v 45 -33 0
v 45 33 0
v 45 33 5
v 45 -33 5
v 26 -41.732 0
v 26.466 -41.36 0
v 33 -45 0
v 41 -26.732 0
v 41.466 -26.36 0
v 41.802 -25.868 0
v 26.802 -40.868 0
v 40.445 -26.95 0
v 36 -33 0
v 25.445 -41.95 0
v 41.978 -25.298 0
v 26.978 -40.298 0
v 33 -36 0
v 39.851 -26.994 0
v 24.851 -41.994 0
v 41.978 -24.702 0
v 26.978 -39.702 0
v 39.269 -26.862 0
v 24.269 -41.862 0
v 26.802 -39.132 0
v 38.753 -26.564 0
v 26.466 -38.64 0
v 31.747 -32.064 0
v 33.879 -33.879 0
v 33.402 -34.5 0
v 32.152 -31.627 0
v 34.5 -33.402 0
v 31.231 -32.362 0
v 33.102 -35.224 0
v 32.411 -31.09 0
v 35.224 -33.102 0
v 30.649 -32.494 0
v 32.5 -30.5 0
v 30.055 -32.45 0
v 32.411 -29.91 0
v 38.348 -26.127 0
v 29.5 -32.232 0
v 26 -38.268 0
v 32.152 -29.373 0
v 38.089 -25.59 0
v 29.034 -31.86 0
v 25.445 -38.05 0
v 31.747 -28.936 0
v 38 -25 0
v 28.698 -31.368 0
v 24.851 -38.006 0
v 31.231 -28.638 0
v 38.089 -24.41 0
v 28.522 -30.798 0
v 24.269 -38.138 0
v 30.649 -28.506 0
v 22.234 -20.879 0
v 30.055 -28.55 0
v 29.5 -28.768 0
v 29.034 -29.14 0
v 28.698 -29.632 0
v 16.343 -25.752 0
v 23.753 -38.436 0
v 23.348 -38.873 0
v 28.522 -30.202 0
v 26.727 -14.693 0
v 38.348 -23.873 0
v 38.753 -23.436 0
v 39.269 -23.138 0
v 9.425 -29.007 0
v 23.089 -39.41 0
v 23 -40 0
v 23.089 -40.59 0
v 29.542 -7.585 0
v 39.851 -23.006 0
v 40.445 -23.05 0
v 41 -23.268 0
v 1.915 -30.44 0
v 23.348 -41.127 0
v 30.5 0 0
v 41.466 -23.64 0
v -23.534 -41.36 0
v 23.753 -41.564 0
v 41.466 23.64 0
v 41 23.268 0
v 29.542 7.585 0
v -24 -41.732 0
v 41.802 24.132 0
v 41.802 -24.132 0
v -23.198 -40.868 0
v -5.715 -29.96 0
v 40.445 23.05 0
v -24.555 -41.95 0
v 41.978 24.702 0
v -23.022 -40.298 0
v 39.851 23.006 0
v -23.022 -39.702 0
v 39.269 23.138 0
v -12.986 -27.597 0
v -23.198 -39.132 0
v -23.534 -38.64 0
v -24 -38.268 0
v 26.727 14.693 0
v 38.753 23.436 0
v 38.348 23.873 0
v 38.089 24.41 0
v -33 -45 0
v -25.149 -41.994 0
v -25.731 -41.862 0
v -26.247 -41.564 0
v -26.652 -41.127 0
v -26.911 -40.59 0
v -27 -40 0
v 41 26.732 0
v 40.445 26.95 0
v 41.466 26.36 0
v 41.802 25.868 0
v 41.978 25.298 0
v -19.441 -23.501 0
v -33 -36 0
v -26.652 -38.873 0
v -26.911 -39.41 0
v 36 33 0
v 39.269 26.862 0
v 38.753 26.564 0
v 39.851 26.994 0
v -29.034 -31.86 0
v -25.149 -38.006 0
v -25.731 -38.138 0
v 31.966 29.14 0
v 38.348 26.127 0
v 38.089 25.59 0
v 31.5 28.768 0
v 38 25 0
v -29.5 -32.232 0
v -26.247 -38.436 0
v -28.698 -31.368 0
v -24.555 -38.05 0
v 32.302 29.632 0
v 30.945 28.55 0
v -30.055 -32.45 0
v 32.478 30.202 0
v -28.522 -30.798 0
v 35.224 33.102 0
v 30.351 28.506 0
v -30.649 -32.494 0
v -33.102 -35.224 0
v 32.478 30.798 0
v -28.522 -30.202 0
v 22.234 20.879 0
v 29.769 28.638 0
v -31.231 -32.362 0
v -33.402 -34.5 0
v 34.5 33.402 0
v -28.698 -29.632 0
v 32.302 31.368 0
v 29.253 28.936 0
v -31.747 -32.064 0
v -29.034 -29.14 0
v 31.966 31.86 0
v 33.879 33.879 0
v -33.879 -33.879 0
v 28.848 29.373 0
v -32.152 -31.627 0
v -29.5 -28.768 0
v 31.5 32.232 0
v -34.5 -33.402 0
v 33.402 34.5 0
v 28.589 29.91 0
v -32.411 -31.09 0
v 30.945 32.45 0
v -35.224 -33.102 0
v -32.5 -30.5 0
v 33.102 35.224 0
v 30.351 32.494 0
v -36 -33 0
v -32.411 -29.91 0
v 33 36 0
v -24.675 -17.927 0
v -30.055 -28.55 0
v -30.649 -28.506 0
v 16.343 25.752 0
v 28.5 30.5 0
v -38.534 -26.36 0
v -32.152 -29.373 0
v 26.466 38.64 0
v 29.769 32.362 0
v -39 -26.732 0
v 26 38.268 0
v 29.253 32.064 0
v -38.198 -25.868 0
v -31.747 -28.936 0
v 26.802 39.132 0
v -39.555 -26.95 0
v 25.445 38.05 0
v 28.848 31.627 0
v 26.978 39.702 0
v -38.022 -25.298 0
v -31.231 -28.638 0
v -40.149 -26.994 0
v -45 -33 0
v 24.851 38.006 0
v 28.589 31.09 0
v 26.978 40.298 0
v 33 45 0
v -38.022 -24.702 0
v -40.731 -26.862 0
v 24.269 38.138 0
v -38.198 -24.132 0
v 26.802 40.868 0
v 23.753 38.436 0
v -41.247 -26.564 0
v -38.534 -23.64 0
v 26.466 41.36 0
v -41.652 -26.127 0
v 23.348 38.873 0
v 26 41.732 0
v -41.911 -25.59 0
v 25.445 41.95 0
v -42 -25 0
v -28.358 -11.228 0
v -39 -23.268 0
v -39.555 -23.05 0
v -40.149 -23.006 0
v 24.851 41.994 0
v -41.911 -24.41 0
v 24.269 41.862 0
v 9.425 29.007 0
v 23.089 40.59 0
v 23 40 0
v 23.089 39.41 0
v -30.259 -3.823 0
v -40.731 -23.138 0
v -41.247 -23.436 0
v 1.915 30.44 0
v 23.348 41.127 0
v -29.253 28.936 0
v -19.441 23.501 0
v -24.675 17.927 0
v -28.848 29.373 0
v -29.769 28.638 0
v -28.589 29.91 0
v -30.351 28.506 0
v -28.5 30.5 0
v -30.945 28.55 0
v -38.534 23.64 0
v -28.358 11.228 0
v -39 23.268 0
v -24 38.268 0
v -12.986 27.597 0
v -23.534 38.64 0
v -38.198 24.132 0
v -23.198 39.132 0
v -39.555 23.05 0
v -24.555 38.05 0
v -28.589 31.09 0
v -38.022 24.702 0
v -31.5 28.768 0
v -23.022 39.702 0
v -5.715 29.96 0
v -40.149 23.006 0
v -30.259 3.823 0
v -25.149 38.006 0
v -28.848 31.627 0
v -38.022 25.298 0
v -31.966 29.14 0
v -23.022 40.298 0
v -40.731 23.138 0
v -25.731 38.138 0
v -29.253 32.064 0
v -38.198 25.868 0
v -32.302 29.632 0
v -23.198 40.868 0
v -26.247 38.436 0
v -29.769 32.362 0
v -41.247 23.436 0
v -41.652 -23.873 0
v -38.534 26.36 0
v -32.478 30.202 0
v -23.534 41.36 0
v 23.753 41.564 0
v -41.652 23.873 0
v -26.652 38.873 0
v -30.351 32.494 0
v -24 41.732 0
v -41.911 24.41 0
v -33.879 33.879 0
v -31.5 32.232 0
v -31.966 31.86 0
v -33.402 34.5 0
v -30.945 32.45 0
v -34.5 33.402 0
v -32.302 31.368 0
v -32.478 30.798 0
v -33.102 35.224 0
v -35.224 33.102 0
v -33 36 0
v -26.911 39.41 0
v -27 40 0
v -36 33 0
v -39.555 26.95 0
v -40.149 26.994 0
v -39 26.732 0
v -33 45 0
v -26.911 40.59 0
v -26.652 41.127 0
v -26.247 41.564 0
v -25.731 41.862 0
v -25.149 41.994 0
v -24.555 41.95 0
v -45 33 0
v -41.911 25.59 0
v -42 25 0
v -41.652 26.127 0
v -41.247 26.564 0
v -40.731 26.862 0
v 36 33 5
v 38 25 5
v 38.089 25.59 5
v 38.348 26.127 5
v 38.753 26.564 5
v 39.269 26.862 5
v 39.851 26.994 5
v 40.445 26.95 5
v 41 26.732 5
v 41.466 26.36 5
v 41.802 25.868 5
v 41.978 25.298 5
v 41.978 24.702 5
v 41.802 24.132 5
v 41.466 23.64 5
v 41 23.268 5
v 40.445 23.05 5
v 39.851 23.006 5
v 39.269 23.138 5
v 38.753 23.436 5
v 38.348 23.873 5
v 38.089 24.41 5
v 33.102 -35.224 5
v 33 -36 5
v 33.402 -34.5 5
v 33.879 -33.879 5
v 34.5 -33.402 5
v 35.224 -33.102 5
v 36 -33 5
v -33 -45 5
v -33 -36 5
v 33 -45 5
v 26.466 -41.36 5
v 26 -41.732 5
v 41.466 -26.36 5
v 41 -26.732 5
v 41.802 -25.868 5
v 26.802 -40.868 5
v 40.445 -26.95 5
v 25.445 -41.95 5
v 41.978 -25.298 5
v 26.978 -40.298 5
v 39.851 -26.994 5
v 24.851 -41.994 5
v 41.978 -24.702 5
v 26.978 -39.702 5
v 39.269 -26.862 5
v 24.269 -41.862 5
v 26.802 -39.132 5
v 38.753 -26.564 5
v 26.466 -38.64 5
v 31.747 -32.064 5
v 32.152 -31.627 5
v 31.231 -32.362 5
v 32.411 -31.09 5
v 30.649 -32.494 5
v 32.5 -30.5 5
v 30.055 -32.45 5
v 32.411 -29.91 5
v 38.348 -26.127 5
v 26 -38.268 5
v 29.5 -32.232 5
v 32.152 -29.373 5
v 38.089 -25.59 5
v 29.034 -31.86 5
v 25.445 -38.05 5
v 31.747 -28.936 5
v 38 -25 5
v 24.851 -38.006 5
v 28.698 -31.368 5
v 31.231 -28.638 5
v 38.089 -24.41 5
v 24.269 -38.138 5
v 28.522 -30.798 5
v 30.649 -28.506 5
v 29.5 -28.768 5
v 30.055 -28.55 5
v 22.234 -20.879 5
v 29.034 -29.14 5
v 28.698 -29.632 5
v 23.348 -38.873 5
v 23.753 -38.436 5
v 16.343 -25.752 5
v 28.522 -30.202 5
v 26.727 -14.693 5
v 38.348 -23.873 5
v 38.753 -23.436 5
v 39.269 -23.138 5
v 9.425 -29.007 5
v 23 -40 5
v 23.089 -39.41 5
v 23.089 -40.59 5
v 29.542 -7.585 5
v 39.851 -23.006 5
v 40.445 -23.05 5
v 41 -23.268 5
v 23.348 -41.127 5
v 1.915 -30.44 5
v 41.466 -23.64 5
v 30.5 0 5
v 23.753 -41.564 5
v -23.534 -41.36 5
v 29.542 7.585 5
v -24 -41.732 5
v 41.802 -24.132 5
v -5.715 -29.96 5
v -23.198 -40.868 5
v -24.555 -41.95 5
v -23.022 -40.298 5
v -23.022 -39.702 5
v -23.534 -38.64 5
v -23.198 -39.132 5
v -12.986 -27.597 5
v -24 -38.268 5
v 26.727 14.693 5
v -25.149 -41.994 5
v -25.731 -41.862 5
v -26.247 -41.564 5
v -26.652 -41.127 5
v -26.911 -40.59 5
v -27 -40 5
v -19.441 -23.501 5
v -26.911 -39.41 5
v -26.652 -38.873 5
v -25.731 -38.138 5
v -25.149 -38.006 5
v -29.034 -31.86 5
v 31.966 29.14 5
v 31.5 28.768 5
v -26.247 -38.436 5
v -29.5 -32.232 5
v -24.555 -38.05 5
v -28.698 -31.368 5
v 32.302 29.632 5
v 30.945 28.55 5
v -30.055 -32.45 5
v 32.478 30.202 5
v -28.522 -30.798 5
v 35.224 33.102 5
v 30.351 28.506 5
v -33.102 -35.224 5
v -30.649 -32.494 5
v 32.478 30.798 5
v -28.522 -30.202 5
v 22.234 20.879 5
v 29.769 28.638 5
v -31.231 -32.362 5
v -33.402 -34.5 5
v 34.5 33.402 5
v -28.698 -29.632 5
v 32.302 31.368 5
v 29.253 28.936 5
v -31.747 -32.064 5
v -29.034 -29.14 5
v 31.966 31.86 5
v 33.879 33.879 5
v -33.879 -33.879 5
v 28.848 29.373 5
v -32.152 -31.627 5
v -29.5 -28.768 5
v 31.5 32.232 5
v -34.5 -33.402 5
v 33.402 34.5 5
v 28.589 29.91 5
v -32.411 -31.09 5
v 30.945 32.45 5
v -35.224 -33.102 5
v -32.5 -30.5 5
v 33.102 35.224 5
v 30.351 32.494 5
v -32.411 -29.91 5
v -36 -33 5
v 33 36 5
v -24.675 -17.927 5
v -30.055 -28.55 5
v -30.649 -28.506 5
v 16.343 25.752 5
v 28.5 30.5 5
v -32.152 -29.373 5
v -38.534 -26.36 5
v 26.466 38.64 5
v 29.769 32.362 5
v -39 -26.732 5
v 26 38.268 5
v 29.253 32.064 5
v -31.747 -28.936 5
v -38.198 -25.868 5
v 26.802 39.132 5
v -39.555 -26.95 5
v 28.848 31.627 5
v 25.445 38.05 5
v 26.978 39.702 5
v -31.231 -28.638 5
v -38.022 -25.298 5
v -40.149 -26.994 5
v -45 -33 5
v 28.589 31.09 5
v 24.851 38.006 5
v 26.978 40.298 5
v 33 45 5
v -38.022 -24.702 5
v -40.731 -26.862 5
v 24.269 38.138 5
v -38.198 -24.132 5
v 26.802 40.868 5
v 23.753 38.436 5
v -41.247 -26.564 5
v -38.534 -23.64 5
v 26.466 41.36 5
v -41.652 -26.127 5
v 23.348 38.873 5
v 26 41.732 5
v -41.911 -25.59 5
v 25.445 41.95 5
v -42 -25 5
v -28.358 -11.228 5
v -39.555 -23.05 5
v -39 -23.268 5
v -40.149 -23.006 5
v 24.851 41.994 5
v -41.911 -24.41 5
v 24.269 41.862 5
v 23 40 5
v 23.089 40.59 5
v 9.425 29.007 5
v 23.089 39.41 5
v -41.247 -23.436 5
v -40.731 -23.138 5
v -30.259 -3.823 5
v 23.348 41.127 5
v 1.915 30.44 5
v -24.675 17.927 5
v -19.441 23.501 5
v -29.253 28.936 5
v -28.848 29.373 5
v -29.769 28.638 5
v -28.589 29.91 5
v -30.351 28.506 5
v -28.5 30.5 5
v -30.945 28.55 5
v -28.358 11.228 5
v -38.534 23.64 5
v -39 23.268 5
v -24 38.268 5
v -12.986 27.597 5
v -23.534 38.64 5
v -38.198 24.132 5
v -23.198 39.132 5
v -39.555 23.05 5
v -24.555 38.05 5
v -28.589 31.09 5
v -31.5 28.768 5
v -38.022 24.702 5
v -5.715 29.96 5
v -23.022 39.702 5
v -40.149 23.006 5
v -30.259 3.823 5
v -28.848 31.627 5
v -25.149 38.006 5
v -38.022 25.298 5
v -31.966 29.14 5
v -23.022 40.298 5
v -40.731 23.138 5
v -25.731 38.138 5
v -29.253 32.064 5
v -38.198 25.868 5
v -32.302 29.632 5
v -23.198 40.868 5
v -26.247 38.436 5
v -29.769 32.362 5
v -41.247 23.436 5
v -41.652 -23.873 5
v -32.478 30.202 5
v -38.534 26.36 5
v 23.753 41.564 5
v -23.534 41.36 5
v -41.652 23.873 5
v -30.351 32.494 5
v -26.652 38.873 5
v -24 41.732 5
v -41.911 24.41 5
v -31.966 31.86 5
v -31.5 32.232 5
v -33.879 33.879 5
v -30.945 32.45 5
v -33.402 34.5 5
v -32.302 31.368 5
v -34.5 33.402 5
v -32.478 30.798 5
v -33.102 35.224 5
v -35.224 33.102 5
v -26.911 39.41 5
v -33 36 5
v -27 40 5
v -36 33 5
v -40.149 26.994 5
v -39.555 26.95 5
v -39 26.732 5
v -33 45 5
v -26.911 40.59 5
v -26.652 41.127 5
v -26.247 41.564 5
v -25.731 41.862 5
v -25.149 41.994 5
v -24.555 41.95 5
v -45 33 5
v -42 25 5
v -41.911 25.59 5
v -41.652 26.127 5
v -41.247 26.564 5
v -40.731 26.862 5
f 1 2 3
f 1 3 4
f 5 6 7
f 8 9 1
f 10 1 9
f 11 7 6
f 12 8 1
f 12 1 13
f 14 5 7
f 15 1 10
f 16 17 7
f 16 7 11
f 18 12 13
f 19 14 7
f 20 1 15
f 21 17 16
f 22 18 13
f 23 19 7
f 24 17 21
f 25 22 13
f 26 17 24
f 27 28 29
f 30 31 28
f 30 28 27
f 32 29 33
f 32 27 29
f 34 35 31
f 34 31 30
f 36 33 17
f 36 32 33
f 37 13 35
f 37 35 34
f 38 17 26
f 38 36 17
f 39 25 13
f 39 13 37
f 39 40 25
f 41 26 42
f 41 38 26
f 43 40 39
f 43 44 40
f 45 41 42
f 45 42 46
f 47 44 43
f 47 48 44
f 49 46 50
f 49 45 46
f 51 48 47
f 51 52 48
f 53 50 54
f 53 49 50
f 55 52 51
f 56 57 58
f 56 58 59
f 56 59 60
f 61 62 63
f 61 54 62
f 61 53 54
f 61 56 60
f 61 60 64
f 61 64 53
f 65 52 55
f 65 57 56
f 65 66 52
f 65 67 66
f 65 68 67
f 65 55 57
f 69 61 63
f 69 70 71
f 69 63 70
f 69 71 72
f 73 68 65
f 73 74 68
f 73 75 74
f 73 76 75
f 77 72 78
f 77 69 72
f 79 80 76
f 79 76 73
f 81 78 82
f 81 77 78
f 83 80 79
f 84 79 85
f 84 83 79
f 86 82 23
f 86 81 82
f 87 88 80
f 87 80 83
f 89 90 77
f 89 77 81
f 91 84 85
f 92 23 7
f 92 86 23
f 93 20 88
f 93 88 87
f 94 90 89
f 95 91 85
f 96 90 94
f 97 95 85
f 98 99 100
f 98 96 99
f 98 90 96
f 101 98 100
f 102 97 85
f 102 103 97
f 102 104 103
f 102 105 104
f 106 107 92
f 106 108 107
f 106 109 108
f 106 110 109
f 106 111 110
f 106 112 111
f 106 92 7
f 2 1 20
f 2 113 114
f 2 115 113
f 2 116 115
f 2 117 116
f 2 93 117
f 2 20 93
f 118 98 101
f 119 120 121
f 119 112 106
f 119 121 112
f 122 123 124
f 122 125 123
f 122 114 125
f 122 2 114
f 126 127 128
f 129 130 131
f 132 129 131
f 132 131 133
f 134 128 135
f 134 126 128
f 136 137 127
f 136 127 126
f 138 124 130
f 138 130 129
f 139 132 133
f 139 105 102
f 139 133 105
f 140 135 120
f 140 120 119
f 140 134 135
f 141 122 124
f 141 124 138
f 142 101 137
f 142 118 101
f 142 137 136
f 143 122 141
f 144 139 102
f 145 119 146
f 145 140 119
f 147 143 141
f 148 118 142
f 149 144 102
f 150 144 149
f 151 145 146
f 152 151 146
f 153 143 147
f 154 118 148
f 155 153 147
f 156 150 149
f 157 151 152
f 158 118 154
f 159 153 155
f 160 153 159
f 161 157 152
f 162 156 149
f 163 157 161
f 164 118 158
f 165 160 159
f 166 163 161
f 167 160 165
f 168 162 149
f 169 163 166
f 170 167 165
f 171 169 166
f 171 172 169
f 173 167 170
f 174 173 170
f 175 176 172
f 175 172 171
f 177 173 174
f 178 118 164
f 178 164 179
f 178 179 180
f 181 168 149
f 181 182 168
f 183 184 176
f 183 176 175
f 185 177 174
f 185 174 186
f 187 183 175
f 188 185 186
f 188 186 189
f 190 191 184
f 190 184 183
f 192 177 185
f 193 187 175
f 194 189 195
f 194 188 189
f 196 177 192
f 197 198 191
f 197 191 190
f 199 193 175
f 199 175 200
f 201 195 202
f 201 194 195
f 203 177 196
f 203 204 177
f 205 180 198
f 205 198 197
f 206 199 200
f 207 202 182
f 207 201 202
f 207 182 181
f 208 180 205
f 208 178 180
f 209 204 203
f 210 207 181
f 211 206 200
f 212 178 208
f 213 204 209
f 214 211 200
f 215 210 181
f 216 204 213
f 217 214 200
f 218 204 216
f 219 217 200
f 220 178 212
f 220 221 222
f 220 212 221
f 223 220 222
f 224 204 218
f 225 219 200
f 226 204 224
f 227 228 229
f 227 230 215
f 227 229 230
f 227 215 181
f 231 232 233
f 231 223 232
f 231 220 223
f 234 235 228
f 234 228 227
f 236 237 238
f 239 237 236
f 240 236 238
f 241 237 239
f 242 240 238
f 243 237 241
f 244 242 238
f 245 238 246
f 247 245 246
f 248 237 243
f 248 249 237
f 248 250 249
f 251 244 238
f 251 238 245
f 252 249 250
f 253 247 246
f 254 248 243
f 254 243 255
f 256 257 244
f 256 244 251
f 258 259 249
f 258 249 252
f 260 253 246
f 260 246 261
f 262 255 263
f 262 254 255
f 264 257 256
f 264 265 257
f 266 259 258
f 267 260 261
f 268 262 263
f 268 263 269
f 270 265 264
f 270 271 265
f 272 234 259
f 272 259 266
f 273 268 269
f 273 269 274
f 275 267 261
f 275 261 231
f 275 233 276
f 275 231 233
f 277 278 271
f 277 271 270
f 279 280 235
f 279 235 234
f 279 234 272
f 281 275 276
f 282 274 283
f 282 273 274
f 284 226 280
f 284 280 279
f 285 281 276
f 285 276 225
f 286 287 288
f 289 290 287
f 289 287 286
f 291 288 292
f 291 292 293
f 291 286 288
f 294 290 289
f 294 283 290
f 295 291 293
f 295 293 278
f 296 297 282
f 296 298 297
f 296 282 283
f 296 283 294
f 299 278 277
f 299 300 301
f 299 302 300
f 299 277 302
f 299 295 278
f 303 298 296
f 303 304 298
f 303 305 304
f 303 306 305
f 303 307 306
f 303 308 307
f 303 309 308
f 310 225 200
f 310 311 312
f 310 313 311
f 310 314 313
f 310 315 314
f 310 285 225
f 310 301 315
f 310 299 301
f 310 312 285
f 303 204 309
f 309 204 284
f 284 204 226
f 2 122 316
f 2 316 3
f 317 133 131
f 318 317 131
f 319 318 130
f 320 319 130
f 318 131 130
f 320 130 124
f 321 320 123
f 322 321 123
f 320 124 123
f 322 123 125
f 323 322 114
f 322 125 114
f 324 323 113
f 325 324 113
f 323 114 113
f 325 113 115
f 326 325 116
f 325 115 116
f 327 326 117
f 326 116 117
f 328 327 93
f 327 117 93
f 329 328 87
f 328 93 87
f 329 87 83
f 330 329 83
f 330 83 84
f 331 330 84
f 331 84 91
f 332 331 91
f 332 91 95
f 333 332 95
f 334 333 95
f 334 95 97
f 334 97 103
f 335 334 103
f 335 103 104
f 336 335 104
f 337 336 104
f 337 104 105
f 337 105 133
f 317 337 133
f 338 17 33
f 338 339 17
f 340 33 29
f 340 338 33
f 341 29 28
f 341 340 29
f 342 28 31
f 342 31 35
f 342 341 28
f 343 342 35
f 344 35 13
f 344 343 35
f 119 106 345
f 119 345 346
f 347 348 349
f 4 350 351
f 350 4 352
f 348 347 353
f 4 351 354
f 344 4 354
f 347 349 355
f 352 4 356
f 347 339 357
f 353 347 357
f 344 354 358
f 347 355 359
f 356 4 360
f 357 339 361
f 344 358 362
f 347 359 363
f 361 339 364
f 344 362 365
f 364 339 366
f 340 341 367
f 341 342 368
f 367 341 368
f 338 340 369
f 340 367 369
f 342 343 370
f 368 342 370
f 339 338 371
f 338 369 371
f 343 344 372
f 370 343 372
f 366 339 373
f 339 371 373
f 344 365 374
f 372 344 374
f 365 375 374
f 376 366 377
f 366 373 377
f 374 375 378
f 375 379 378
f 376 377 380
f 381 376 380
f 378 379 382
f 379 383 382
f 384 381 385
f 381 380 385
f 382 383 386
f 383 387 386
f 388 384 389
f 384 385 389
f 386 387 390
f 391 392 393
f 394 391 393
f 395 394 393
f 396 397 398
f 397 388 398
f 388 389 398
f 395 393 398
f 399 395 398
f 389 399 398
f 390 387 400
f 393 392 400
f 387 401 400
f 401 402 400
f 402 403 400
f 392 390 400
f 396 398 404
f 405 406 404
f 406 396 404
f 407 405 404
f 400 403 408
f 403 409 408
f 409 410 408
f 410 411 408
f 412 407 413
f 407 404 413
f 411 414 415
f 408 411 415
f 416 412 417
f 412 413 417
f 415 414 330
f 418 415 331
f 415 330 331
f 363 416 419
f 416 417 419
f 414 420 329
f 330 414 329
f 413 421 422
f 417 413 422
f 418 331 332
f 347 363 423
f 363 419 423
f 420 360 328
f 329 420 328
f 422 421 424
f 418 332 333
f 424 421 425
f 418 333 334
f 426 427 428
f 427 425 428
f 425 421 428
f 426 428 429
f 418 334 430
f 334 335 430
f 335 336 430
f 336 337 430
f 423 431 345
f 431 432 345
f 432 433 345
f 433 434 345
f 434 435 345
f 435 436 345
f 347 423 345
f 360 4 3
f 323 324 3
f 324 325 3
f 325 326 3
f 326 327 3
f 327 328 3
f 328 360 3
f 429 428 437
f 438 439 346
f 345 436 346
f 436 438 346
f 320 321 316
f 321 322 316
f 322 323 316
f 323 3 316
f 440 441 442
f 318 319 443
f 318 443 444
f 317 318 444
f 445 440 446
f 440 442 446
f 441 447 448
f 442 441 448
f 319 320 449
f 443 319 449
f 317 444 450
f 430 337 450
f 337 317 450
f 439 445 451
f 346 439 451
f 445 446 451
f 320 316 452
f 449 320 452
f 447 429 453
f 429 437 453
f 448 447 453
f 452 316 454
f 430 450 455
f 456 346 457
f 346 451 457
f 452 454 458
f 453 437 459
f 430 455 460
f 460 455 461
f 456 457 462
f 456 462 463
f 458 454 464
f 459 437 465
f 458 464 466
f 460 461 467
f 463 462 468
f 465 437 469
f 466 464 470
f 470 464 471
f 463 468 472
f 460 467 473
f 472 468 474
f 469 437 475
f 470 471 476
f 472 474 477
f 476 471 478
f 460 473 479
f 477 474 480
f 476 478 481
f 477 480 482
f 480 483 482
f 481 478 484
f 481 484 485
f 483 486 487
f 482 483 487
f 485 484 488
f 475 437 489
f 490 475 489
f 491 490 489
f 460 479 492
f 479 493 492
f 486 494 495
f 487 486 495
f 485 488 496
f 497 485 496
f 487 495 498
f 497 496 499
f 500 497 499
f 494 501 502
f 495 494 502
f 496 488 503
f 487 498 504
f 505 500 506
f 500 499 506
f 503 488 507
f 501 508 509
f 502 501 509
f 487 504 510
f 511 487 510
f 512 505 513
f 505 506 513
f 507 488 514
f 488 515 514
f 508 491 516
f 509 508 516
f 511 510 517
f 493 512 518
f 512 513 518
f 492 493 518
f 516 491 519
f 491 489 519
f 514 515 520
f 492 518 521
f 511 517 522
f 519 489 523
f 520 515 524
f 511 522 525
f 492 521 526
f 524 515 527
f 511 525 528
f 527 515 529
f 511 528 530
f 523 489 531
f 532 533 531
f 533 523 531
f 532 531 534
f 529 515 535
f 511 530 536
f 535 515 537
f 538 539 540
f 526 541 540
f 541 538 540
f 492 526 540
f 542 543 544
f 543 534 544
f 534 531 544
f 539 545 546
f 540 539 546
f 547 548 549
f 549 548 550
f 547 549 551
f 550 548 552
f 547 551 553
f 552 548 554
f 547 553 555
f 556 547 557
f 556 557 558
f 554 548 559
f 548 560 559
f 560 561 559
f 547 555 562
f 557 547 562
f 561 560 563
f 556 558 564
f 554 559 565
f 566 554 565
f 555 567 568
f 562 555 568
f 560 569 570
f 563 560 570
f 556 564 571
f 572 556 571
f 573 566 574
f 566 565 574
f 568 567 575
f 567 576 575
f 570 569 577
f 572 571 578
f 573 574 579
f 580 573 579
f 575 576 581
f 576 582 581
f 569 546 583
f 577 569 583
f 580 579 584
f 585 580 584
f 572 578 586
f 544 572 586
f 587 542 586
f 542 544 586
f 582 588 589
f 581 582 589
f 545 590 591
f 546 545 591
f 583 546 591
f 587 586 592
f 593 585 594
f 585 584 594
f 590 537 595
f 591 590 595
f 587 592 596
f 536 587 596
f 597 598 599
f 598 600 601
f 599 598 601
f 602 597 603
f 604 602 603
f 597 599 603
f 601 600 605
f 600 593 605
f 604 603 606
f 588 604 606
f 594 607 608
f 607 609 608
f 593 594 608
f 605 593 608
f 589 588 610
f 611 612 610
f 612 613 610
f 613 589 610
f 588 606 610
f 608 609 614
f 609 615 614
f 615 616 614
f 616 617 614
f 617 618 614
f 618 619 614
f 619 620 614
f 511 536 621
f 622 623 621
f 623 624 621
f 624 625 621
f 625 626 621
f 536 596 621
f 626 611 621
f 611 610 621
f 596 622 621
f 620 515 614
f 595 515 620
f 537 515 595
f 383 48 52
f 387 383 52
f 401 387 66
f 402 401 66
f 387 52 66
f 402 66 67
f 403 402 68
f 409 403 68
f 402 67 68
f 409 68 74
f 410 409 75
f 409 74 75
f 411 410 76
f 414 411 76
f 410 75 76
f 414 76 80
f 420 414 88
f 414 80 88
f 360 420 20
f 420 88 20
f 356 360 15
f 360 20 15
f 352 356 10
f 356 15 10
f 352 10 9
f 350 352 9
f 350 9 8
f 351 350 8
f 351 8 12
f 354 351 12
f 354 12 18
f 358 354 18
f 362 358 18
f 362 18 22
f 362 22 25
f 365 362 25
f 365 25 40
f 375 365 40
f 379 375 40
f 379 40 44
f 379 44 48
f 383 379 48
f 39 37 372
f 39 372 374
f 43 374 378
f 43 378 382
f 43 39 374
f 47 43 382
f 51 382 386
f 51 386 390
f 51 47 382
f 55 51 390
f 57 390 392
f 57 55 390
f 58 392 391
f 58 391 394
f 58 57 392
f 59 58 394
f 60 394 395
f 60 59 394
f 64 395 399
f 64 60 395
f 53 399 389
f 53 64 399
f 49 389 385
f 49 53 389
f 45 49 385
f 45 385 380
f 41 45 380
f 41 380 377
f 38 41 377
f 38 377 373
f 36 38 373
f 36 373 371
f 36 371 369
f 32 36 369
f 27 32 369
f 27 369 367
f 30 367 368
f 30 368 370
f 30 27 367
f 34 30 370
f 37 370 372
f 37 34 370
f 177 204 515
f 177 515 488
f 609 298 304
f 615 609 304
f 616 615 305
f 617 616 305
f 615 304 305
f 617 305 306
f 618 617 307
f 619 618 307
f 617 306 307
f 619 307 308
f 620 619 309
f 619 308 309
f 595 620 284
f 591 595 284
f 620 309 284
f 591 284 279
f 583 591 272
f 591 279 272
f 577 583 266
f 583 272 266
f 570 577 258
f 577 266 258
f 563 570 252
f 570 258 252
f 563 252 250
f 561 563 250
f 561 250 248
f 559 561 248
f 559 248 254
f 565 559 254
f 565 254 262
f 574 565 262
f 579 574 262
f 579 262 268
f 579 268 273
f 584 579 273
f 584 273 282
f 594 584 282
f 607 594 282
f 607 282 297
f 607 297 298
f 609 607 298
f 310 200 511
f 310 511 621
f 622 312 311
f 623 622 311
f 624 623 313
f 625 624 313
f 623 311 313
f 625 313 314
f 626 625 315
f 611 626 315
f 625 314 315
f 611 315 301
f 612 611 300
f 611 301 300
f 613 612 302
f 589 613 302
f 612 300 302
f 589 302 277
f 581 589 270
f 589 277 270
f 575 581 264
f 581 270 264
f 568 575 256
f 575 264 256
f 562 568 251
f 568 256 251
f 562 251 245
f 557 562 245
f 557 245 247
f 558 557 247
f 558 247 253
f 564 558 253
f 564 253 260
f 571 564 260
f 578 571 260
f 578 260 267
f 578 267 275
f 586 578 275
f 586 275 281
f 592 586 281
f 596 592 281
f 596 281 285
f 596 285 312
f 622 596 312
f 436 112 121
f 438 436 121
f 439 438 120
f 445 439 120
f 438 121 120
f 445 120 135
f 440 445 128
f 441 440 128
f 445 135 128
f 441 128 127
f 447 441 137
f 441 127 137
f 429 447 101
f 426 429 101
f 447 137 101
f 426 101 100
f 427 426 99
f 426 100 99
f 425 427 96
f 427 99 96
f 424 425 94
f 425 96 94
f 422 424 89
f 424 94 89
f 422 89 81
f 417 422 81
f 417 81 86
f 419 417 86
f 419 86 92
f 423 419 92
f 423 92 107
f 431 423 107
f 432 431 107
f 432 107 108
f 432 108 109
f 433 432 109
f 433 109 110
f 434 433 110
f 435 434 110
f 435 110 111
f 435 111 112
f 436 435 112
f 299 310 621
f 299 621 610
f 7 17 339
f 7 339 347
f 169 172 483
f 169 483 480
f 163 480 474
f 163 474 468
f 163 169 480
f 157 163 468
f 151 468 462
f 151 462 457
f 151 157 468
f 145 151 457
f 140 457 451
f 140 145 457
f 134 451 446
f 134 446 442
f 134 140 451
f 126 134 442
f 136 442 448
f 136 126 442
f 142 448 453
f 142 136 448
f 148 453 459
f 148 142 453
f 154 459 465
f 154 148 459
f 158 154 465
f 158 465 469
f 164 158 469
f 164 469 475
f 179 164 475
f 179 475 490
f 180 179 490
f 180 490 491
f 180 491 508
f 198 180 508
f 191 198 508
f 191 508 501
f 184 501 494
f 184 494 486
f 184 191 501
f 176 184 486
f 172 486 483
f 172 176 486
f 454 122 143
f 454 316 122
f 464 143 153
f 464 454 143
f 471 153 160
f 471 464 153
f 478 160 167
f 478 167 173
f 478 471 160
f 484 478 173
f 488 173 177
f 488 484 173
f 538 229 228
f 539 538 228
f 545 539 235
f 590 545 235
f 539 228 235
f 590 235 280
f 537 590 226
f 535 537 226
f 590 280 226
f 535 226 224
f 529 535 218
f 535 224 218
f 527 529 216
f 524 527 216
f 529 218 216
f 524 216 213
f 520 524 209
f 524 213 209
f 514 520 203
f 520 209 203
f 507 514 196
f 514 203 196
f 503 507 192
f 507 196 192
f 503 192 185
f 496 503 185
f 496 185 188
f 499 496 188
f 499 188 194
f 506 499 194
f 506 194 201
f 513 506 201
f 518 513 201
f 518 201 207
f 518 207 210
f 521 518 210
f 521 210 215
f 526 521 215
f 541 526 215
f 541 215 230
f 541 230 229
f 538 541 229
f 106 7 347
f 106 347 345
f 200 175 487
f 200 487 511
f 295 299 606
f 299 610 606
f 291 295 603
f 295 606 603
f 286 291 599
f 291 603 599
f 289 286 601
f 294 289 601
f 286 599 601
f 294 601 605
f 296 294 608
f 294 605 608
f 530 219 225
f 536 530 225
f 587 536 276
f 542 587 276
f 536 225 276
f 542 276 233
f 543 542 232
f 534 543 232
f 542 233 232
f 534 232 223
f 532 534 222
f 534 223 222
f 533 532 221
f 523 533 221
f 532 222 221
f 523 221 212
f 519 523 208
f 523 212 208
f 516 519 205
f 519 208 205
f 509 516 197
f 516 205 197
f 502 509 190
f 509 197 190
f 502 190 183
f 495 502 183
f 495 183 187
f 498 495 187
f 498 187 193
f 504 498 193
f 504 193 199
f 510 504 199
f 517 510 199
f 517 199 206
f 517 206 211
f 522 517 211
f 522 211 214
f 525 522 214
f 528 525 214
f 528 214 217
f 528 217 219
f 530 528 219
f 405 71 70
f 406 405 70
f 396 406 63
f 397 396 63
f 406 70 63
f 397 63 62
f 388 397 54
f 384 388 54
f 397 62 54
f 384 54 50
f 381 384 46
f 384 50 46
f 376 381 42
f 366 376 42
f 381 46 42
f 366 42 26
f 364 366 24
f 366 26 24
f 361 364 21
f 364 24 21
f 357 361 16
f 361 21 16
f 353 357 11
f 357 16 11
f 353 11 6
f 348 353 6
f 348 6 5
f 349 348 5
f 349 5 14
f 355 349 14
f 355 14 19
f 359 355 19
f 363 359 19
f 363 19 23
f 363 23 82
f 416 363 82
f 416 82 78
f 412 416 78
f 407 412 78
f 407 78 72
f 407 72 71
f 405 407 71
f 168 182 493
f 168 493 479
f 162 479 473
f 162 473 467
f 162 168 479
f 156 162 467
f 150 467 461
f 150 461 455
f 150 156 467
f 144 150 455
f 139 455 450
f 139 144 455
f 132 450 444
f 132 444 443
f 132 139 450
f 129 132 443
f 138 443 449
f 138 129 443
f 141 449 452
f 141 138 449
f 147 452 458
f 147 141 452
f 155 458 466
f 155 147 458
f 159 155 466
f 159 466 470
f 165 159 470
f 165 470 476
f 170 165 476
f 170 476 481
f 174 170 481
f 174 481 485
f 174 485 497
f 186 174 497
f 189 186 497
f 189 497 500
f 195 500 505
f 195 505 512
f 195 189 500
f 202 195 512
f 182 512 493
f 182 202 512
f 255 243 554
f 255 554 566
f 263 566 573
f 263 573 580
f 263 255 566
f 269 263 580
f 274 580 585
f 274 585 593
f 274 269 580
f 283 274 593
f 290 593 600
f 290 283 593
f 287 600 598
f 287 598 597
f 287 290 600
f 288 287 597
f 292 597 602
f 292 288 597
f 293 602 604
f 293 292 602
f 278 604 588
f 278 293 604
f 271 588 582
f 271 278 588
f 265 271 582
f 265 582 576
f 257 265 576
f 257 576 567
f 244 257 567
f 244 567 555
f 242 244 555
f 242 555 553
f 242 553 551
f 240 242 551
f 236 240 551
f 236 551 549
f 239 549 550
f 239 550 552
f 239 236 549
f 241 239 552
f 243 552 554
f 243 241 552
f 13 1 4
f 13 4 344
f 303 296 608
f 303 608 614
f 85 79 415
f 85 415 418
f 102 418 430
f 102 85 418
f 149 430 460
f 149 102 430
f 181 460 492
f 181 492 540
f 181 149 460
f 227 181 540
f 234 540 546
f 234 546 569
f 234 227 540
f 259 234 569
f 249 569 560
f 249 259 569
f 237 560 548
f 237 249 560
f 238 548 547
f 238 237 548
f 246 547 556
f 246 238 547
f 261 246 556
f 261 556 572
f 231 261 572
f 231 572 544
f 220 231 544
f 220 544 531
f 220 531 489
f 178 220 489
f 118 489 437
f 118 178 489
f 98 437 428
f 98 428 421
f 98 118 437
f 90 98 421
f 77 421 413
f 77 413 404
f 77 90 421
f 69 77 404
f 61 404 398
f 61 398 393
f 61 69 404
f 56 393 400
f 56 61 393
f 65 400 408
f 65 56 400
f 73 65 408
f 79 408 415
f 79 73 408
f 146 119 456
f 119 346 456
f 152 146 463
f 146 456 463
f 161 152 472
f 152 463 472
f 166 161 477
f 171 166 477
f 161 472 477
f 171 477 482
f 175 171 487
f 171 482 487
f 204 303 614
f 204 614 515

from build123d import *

# Parameters (mm, degrees)
SKETCH1_R           = 30.5
SKETCH1_R_2         = 2
BOSS_EXTRUDE1_DEPTH = 5
FILLET1_R           = 3
CUT_EXTRUDE1_REACH  = 65.836
SKETCH2_R           = 2


with BuildPart() as part:
    # Sketch1 → Boss-Extrude1 (new body)
    with BuildSketch(Plane.XY):
        Polygon((33, -45), (-33, -45), (-33, -33), (-45, -33), (-45, 33), (-33, 33), (-33, 45), (33, 45), (33, 33), (45, 33), (45, -33), (33, -33), align=None)
        Circle(SKETCH1_R, mode=Mode.SUBTRACT)
        with Locations((-30.5, 30.5)):
            Circle(SKETCH1_R_2, mode=Mode.SUBTRACT)
        with Locations(Location((30.5, 30.5, 0), (0, 0, 180))):
            Circle(SKETCH1_R_2, mode=Mode.SUBTRACT)
        with Locations((30.5, -30.5)):
            Circle(SKETCH1_R_2, mode=Mode.SUBTRACT)
        with Locations(Location((-30.5, -30.5, 0), (0, 0, 180))):
            Circle(SKETCH1_R_2, mode=Mode.SUBTRACT)
    extrude(amount=BOSS_EXTRUDE1_DEPTH)

    # Fillet1
    fillet1_edges = [part.edges().sort_by_distance(p)[0] for p in [
        (33, 33, 2.5),
        (33, -33, 2.5),
        (-33, -33, 2.5),
        (-33, 33, 2.5),
    ]]
    fillet(fillet1_edges, radius=FILLET1_R)

    # Sketch2 → Cut-Extrude1 (cut, up to next)
    with BuildSketch(Plane(origin=(0, 0, 0), x_dir=(-1, 0, 0), z_dir=(0, 0, -1)), mode=Mode.PRIVATE) as cut_extrude1_sk1:
        with Locations((-25, 40)):
            Circle(SKETCH2_R)
    cut_extrude1_tool1 = extrude(cut_extrude1_sk1.sketch, amount=-CUT_EXTRUDE1_REACH, mode=Mode.PRIVATE) & part.part
    # Sketch2 → Cut-Extrude1 (cut, up to next)
    with BuildSketch(Plane(origin=(0, 0, 0), x_dir=(-1, 0, 0), z_dir=(0, 0, -1)), mode=Mode.PRIVATE) as cut_extrude1_sk2:
        with Locations((40, 25)):
            Circle(SKETCH2_R)
    cut_extrude1_tool2 = extrude(cut_extrude1_sk2.sketch, amount=-CUT_EXTRUDE1_REACH, mode=Mode.PRIVATE) & part.part
    # Sketch2 → Cut-Extrude1 (cut, up to next)
    with BuildSketch(Plane(origin=(0, 0, 0), x_dir=(-1, 0, 0), z_dir=(0, 0, -1)), mode=Mode.PRIVATE) as cut_extrude1_sk3:
        with Locations((25, 40)):
            Circle(SKETCH2_R)
    cut_extrude1_tool3 = extrude(cut_extrude1_sk3.sketch, amount=-CUT_EXTRUDE1_REACH, mode=Mode.PRIVATE) & part.part
    # Sketch2 → Cut-Extrude1 (cut, up to next)
    with BuildSketch(Plane(origin=(0, 0, 0), x_dir=(-1, 0, 0), z_dir=(0, 0, -1)), mode=Mode.PRIVATE) as cut_extrude1_sk4:
        with Locations((25, -40)):
            Circle(SKETCH2_R)
    cut_extrude1_tool4 = extrude(cut_extrude1_sk4.sketch, amount=-CUT_EXTRUDE1_REACH, mode=Mode.PRIVATE) & part.part
    # Sketch2 → Cut-Extrude1 (cut, up to next)
    with BuildSketch(Plane(origin=(0, 0, 0), x_dir=(-1, 0, 0), z_dir=(0, 0, -1)), mode=Mode.PRIVATE) as cut_extrude1_sk5:
        with Locations((-25, -40)):
            Circle(SKETCH2_R)
    cut_extrude1_tool5 = extrude(cut_extrude1_sk5.sketch, amount=-CUT_EXTRUDE1_REACH, mode=Mode.PRIVATE) & part.part
    # Sketch2 → Cut-Extrude1 (cut, up to next)
    with BuildSketch(Plane(origin=(0, 0, 0), x_dir=(-1, 0, 0), z_dir=(0, 0, -1)), mode=Mode.PRIVATE) as cut_extrude1_sk6:
        with Locations((40, -25)):
            Circle(SKETCH2_R)
    cut_extrude1_tool6 = extrude(cut_extrude1_sk6.sketch, amount=-CUT_EXTRUDE1_REACH, mode=Mode.PRIVATE) & part.part
    # Sketch2 → Cut-Extrude1 (cut, up to next)
    with BuildSketch(Plane(origin=(0, 0, 0), x_dir=(-1, 0, 0), z_dir=(0, 0, -1)), mode=Mode.PRIVATE) as cut_extrude1_sk7:
        with Locations((-40, 25)):
            Circle(SKETCH2_R)
    cut_extrude1_tool7 = extrude(cut_extrude1_sk7.sketch, amount=-CUT_EXTRUDE1_REACH, mode=Mode.PRIVATE) & part.part
    # Sketch2 → Cut-Extrude1 (cut, up to next)
    with BuildSketch(Plane(origin=(0, 0, 0), x_dir=(-1, 0, 0), z_dir=(0, 0, -1)), mode=Mode.PRIVATE) as cut_extrude1_sk8:
        with Locations((-40, -25)):
            Circle(SKETCH2_R)
    cut_extrude1_tool8 = extrude(cut_extrude1_sk8.sketch, amount=-CUT_EXTRUDE1_REACH, mode=Mode.PRIVATE) & part.part
    add(cut_extrude1_tool1.solids().sort_by_distance((25, 40, 0))[0], mode=Mode.SUBTRACT)
    add(cut_extrude1_tool2.solids().sort_by_distance((-40, 25, 0))[0], mode=Mode.SUBTRACT)
    add(cut_extrude1_tool3.solids().sort_by_distance((-25, 40, 0))[0], mode=Mode.SUBTRACT)
    add(cut_extrude1_tool4.solids().sort_by_distance((-25, -40, 0))[0], mode=Mode.SUBTRACT)
    add(cut_extrude1_tool5.solids().sort_by_distance((25, -40, 0))[0], mode=Mode.SUBTRACT)
    add(cut_extrude1_tool6.solids().sort_by_distance((-40, -25, 0))[0], mode=Mode.SUBTRACT)
    add(cut_extrude1_tool7.solids().sort_by_distance((40, 25, 0))[0], mode=Mode.SUBTRACT)
    add(cut_extrude1_tool8.solids().sort_by_distance((40, -25, 0))[0], mode=Mode.SUBTRACT)


solid = part.part
